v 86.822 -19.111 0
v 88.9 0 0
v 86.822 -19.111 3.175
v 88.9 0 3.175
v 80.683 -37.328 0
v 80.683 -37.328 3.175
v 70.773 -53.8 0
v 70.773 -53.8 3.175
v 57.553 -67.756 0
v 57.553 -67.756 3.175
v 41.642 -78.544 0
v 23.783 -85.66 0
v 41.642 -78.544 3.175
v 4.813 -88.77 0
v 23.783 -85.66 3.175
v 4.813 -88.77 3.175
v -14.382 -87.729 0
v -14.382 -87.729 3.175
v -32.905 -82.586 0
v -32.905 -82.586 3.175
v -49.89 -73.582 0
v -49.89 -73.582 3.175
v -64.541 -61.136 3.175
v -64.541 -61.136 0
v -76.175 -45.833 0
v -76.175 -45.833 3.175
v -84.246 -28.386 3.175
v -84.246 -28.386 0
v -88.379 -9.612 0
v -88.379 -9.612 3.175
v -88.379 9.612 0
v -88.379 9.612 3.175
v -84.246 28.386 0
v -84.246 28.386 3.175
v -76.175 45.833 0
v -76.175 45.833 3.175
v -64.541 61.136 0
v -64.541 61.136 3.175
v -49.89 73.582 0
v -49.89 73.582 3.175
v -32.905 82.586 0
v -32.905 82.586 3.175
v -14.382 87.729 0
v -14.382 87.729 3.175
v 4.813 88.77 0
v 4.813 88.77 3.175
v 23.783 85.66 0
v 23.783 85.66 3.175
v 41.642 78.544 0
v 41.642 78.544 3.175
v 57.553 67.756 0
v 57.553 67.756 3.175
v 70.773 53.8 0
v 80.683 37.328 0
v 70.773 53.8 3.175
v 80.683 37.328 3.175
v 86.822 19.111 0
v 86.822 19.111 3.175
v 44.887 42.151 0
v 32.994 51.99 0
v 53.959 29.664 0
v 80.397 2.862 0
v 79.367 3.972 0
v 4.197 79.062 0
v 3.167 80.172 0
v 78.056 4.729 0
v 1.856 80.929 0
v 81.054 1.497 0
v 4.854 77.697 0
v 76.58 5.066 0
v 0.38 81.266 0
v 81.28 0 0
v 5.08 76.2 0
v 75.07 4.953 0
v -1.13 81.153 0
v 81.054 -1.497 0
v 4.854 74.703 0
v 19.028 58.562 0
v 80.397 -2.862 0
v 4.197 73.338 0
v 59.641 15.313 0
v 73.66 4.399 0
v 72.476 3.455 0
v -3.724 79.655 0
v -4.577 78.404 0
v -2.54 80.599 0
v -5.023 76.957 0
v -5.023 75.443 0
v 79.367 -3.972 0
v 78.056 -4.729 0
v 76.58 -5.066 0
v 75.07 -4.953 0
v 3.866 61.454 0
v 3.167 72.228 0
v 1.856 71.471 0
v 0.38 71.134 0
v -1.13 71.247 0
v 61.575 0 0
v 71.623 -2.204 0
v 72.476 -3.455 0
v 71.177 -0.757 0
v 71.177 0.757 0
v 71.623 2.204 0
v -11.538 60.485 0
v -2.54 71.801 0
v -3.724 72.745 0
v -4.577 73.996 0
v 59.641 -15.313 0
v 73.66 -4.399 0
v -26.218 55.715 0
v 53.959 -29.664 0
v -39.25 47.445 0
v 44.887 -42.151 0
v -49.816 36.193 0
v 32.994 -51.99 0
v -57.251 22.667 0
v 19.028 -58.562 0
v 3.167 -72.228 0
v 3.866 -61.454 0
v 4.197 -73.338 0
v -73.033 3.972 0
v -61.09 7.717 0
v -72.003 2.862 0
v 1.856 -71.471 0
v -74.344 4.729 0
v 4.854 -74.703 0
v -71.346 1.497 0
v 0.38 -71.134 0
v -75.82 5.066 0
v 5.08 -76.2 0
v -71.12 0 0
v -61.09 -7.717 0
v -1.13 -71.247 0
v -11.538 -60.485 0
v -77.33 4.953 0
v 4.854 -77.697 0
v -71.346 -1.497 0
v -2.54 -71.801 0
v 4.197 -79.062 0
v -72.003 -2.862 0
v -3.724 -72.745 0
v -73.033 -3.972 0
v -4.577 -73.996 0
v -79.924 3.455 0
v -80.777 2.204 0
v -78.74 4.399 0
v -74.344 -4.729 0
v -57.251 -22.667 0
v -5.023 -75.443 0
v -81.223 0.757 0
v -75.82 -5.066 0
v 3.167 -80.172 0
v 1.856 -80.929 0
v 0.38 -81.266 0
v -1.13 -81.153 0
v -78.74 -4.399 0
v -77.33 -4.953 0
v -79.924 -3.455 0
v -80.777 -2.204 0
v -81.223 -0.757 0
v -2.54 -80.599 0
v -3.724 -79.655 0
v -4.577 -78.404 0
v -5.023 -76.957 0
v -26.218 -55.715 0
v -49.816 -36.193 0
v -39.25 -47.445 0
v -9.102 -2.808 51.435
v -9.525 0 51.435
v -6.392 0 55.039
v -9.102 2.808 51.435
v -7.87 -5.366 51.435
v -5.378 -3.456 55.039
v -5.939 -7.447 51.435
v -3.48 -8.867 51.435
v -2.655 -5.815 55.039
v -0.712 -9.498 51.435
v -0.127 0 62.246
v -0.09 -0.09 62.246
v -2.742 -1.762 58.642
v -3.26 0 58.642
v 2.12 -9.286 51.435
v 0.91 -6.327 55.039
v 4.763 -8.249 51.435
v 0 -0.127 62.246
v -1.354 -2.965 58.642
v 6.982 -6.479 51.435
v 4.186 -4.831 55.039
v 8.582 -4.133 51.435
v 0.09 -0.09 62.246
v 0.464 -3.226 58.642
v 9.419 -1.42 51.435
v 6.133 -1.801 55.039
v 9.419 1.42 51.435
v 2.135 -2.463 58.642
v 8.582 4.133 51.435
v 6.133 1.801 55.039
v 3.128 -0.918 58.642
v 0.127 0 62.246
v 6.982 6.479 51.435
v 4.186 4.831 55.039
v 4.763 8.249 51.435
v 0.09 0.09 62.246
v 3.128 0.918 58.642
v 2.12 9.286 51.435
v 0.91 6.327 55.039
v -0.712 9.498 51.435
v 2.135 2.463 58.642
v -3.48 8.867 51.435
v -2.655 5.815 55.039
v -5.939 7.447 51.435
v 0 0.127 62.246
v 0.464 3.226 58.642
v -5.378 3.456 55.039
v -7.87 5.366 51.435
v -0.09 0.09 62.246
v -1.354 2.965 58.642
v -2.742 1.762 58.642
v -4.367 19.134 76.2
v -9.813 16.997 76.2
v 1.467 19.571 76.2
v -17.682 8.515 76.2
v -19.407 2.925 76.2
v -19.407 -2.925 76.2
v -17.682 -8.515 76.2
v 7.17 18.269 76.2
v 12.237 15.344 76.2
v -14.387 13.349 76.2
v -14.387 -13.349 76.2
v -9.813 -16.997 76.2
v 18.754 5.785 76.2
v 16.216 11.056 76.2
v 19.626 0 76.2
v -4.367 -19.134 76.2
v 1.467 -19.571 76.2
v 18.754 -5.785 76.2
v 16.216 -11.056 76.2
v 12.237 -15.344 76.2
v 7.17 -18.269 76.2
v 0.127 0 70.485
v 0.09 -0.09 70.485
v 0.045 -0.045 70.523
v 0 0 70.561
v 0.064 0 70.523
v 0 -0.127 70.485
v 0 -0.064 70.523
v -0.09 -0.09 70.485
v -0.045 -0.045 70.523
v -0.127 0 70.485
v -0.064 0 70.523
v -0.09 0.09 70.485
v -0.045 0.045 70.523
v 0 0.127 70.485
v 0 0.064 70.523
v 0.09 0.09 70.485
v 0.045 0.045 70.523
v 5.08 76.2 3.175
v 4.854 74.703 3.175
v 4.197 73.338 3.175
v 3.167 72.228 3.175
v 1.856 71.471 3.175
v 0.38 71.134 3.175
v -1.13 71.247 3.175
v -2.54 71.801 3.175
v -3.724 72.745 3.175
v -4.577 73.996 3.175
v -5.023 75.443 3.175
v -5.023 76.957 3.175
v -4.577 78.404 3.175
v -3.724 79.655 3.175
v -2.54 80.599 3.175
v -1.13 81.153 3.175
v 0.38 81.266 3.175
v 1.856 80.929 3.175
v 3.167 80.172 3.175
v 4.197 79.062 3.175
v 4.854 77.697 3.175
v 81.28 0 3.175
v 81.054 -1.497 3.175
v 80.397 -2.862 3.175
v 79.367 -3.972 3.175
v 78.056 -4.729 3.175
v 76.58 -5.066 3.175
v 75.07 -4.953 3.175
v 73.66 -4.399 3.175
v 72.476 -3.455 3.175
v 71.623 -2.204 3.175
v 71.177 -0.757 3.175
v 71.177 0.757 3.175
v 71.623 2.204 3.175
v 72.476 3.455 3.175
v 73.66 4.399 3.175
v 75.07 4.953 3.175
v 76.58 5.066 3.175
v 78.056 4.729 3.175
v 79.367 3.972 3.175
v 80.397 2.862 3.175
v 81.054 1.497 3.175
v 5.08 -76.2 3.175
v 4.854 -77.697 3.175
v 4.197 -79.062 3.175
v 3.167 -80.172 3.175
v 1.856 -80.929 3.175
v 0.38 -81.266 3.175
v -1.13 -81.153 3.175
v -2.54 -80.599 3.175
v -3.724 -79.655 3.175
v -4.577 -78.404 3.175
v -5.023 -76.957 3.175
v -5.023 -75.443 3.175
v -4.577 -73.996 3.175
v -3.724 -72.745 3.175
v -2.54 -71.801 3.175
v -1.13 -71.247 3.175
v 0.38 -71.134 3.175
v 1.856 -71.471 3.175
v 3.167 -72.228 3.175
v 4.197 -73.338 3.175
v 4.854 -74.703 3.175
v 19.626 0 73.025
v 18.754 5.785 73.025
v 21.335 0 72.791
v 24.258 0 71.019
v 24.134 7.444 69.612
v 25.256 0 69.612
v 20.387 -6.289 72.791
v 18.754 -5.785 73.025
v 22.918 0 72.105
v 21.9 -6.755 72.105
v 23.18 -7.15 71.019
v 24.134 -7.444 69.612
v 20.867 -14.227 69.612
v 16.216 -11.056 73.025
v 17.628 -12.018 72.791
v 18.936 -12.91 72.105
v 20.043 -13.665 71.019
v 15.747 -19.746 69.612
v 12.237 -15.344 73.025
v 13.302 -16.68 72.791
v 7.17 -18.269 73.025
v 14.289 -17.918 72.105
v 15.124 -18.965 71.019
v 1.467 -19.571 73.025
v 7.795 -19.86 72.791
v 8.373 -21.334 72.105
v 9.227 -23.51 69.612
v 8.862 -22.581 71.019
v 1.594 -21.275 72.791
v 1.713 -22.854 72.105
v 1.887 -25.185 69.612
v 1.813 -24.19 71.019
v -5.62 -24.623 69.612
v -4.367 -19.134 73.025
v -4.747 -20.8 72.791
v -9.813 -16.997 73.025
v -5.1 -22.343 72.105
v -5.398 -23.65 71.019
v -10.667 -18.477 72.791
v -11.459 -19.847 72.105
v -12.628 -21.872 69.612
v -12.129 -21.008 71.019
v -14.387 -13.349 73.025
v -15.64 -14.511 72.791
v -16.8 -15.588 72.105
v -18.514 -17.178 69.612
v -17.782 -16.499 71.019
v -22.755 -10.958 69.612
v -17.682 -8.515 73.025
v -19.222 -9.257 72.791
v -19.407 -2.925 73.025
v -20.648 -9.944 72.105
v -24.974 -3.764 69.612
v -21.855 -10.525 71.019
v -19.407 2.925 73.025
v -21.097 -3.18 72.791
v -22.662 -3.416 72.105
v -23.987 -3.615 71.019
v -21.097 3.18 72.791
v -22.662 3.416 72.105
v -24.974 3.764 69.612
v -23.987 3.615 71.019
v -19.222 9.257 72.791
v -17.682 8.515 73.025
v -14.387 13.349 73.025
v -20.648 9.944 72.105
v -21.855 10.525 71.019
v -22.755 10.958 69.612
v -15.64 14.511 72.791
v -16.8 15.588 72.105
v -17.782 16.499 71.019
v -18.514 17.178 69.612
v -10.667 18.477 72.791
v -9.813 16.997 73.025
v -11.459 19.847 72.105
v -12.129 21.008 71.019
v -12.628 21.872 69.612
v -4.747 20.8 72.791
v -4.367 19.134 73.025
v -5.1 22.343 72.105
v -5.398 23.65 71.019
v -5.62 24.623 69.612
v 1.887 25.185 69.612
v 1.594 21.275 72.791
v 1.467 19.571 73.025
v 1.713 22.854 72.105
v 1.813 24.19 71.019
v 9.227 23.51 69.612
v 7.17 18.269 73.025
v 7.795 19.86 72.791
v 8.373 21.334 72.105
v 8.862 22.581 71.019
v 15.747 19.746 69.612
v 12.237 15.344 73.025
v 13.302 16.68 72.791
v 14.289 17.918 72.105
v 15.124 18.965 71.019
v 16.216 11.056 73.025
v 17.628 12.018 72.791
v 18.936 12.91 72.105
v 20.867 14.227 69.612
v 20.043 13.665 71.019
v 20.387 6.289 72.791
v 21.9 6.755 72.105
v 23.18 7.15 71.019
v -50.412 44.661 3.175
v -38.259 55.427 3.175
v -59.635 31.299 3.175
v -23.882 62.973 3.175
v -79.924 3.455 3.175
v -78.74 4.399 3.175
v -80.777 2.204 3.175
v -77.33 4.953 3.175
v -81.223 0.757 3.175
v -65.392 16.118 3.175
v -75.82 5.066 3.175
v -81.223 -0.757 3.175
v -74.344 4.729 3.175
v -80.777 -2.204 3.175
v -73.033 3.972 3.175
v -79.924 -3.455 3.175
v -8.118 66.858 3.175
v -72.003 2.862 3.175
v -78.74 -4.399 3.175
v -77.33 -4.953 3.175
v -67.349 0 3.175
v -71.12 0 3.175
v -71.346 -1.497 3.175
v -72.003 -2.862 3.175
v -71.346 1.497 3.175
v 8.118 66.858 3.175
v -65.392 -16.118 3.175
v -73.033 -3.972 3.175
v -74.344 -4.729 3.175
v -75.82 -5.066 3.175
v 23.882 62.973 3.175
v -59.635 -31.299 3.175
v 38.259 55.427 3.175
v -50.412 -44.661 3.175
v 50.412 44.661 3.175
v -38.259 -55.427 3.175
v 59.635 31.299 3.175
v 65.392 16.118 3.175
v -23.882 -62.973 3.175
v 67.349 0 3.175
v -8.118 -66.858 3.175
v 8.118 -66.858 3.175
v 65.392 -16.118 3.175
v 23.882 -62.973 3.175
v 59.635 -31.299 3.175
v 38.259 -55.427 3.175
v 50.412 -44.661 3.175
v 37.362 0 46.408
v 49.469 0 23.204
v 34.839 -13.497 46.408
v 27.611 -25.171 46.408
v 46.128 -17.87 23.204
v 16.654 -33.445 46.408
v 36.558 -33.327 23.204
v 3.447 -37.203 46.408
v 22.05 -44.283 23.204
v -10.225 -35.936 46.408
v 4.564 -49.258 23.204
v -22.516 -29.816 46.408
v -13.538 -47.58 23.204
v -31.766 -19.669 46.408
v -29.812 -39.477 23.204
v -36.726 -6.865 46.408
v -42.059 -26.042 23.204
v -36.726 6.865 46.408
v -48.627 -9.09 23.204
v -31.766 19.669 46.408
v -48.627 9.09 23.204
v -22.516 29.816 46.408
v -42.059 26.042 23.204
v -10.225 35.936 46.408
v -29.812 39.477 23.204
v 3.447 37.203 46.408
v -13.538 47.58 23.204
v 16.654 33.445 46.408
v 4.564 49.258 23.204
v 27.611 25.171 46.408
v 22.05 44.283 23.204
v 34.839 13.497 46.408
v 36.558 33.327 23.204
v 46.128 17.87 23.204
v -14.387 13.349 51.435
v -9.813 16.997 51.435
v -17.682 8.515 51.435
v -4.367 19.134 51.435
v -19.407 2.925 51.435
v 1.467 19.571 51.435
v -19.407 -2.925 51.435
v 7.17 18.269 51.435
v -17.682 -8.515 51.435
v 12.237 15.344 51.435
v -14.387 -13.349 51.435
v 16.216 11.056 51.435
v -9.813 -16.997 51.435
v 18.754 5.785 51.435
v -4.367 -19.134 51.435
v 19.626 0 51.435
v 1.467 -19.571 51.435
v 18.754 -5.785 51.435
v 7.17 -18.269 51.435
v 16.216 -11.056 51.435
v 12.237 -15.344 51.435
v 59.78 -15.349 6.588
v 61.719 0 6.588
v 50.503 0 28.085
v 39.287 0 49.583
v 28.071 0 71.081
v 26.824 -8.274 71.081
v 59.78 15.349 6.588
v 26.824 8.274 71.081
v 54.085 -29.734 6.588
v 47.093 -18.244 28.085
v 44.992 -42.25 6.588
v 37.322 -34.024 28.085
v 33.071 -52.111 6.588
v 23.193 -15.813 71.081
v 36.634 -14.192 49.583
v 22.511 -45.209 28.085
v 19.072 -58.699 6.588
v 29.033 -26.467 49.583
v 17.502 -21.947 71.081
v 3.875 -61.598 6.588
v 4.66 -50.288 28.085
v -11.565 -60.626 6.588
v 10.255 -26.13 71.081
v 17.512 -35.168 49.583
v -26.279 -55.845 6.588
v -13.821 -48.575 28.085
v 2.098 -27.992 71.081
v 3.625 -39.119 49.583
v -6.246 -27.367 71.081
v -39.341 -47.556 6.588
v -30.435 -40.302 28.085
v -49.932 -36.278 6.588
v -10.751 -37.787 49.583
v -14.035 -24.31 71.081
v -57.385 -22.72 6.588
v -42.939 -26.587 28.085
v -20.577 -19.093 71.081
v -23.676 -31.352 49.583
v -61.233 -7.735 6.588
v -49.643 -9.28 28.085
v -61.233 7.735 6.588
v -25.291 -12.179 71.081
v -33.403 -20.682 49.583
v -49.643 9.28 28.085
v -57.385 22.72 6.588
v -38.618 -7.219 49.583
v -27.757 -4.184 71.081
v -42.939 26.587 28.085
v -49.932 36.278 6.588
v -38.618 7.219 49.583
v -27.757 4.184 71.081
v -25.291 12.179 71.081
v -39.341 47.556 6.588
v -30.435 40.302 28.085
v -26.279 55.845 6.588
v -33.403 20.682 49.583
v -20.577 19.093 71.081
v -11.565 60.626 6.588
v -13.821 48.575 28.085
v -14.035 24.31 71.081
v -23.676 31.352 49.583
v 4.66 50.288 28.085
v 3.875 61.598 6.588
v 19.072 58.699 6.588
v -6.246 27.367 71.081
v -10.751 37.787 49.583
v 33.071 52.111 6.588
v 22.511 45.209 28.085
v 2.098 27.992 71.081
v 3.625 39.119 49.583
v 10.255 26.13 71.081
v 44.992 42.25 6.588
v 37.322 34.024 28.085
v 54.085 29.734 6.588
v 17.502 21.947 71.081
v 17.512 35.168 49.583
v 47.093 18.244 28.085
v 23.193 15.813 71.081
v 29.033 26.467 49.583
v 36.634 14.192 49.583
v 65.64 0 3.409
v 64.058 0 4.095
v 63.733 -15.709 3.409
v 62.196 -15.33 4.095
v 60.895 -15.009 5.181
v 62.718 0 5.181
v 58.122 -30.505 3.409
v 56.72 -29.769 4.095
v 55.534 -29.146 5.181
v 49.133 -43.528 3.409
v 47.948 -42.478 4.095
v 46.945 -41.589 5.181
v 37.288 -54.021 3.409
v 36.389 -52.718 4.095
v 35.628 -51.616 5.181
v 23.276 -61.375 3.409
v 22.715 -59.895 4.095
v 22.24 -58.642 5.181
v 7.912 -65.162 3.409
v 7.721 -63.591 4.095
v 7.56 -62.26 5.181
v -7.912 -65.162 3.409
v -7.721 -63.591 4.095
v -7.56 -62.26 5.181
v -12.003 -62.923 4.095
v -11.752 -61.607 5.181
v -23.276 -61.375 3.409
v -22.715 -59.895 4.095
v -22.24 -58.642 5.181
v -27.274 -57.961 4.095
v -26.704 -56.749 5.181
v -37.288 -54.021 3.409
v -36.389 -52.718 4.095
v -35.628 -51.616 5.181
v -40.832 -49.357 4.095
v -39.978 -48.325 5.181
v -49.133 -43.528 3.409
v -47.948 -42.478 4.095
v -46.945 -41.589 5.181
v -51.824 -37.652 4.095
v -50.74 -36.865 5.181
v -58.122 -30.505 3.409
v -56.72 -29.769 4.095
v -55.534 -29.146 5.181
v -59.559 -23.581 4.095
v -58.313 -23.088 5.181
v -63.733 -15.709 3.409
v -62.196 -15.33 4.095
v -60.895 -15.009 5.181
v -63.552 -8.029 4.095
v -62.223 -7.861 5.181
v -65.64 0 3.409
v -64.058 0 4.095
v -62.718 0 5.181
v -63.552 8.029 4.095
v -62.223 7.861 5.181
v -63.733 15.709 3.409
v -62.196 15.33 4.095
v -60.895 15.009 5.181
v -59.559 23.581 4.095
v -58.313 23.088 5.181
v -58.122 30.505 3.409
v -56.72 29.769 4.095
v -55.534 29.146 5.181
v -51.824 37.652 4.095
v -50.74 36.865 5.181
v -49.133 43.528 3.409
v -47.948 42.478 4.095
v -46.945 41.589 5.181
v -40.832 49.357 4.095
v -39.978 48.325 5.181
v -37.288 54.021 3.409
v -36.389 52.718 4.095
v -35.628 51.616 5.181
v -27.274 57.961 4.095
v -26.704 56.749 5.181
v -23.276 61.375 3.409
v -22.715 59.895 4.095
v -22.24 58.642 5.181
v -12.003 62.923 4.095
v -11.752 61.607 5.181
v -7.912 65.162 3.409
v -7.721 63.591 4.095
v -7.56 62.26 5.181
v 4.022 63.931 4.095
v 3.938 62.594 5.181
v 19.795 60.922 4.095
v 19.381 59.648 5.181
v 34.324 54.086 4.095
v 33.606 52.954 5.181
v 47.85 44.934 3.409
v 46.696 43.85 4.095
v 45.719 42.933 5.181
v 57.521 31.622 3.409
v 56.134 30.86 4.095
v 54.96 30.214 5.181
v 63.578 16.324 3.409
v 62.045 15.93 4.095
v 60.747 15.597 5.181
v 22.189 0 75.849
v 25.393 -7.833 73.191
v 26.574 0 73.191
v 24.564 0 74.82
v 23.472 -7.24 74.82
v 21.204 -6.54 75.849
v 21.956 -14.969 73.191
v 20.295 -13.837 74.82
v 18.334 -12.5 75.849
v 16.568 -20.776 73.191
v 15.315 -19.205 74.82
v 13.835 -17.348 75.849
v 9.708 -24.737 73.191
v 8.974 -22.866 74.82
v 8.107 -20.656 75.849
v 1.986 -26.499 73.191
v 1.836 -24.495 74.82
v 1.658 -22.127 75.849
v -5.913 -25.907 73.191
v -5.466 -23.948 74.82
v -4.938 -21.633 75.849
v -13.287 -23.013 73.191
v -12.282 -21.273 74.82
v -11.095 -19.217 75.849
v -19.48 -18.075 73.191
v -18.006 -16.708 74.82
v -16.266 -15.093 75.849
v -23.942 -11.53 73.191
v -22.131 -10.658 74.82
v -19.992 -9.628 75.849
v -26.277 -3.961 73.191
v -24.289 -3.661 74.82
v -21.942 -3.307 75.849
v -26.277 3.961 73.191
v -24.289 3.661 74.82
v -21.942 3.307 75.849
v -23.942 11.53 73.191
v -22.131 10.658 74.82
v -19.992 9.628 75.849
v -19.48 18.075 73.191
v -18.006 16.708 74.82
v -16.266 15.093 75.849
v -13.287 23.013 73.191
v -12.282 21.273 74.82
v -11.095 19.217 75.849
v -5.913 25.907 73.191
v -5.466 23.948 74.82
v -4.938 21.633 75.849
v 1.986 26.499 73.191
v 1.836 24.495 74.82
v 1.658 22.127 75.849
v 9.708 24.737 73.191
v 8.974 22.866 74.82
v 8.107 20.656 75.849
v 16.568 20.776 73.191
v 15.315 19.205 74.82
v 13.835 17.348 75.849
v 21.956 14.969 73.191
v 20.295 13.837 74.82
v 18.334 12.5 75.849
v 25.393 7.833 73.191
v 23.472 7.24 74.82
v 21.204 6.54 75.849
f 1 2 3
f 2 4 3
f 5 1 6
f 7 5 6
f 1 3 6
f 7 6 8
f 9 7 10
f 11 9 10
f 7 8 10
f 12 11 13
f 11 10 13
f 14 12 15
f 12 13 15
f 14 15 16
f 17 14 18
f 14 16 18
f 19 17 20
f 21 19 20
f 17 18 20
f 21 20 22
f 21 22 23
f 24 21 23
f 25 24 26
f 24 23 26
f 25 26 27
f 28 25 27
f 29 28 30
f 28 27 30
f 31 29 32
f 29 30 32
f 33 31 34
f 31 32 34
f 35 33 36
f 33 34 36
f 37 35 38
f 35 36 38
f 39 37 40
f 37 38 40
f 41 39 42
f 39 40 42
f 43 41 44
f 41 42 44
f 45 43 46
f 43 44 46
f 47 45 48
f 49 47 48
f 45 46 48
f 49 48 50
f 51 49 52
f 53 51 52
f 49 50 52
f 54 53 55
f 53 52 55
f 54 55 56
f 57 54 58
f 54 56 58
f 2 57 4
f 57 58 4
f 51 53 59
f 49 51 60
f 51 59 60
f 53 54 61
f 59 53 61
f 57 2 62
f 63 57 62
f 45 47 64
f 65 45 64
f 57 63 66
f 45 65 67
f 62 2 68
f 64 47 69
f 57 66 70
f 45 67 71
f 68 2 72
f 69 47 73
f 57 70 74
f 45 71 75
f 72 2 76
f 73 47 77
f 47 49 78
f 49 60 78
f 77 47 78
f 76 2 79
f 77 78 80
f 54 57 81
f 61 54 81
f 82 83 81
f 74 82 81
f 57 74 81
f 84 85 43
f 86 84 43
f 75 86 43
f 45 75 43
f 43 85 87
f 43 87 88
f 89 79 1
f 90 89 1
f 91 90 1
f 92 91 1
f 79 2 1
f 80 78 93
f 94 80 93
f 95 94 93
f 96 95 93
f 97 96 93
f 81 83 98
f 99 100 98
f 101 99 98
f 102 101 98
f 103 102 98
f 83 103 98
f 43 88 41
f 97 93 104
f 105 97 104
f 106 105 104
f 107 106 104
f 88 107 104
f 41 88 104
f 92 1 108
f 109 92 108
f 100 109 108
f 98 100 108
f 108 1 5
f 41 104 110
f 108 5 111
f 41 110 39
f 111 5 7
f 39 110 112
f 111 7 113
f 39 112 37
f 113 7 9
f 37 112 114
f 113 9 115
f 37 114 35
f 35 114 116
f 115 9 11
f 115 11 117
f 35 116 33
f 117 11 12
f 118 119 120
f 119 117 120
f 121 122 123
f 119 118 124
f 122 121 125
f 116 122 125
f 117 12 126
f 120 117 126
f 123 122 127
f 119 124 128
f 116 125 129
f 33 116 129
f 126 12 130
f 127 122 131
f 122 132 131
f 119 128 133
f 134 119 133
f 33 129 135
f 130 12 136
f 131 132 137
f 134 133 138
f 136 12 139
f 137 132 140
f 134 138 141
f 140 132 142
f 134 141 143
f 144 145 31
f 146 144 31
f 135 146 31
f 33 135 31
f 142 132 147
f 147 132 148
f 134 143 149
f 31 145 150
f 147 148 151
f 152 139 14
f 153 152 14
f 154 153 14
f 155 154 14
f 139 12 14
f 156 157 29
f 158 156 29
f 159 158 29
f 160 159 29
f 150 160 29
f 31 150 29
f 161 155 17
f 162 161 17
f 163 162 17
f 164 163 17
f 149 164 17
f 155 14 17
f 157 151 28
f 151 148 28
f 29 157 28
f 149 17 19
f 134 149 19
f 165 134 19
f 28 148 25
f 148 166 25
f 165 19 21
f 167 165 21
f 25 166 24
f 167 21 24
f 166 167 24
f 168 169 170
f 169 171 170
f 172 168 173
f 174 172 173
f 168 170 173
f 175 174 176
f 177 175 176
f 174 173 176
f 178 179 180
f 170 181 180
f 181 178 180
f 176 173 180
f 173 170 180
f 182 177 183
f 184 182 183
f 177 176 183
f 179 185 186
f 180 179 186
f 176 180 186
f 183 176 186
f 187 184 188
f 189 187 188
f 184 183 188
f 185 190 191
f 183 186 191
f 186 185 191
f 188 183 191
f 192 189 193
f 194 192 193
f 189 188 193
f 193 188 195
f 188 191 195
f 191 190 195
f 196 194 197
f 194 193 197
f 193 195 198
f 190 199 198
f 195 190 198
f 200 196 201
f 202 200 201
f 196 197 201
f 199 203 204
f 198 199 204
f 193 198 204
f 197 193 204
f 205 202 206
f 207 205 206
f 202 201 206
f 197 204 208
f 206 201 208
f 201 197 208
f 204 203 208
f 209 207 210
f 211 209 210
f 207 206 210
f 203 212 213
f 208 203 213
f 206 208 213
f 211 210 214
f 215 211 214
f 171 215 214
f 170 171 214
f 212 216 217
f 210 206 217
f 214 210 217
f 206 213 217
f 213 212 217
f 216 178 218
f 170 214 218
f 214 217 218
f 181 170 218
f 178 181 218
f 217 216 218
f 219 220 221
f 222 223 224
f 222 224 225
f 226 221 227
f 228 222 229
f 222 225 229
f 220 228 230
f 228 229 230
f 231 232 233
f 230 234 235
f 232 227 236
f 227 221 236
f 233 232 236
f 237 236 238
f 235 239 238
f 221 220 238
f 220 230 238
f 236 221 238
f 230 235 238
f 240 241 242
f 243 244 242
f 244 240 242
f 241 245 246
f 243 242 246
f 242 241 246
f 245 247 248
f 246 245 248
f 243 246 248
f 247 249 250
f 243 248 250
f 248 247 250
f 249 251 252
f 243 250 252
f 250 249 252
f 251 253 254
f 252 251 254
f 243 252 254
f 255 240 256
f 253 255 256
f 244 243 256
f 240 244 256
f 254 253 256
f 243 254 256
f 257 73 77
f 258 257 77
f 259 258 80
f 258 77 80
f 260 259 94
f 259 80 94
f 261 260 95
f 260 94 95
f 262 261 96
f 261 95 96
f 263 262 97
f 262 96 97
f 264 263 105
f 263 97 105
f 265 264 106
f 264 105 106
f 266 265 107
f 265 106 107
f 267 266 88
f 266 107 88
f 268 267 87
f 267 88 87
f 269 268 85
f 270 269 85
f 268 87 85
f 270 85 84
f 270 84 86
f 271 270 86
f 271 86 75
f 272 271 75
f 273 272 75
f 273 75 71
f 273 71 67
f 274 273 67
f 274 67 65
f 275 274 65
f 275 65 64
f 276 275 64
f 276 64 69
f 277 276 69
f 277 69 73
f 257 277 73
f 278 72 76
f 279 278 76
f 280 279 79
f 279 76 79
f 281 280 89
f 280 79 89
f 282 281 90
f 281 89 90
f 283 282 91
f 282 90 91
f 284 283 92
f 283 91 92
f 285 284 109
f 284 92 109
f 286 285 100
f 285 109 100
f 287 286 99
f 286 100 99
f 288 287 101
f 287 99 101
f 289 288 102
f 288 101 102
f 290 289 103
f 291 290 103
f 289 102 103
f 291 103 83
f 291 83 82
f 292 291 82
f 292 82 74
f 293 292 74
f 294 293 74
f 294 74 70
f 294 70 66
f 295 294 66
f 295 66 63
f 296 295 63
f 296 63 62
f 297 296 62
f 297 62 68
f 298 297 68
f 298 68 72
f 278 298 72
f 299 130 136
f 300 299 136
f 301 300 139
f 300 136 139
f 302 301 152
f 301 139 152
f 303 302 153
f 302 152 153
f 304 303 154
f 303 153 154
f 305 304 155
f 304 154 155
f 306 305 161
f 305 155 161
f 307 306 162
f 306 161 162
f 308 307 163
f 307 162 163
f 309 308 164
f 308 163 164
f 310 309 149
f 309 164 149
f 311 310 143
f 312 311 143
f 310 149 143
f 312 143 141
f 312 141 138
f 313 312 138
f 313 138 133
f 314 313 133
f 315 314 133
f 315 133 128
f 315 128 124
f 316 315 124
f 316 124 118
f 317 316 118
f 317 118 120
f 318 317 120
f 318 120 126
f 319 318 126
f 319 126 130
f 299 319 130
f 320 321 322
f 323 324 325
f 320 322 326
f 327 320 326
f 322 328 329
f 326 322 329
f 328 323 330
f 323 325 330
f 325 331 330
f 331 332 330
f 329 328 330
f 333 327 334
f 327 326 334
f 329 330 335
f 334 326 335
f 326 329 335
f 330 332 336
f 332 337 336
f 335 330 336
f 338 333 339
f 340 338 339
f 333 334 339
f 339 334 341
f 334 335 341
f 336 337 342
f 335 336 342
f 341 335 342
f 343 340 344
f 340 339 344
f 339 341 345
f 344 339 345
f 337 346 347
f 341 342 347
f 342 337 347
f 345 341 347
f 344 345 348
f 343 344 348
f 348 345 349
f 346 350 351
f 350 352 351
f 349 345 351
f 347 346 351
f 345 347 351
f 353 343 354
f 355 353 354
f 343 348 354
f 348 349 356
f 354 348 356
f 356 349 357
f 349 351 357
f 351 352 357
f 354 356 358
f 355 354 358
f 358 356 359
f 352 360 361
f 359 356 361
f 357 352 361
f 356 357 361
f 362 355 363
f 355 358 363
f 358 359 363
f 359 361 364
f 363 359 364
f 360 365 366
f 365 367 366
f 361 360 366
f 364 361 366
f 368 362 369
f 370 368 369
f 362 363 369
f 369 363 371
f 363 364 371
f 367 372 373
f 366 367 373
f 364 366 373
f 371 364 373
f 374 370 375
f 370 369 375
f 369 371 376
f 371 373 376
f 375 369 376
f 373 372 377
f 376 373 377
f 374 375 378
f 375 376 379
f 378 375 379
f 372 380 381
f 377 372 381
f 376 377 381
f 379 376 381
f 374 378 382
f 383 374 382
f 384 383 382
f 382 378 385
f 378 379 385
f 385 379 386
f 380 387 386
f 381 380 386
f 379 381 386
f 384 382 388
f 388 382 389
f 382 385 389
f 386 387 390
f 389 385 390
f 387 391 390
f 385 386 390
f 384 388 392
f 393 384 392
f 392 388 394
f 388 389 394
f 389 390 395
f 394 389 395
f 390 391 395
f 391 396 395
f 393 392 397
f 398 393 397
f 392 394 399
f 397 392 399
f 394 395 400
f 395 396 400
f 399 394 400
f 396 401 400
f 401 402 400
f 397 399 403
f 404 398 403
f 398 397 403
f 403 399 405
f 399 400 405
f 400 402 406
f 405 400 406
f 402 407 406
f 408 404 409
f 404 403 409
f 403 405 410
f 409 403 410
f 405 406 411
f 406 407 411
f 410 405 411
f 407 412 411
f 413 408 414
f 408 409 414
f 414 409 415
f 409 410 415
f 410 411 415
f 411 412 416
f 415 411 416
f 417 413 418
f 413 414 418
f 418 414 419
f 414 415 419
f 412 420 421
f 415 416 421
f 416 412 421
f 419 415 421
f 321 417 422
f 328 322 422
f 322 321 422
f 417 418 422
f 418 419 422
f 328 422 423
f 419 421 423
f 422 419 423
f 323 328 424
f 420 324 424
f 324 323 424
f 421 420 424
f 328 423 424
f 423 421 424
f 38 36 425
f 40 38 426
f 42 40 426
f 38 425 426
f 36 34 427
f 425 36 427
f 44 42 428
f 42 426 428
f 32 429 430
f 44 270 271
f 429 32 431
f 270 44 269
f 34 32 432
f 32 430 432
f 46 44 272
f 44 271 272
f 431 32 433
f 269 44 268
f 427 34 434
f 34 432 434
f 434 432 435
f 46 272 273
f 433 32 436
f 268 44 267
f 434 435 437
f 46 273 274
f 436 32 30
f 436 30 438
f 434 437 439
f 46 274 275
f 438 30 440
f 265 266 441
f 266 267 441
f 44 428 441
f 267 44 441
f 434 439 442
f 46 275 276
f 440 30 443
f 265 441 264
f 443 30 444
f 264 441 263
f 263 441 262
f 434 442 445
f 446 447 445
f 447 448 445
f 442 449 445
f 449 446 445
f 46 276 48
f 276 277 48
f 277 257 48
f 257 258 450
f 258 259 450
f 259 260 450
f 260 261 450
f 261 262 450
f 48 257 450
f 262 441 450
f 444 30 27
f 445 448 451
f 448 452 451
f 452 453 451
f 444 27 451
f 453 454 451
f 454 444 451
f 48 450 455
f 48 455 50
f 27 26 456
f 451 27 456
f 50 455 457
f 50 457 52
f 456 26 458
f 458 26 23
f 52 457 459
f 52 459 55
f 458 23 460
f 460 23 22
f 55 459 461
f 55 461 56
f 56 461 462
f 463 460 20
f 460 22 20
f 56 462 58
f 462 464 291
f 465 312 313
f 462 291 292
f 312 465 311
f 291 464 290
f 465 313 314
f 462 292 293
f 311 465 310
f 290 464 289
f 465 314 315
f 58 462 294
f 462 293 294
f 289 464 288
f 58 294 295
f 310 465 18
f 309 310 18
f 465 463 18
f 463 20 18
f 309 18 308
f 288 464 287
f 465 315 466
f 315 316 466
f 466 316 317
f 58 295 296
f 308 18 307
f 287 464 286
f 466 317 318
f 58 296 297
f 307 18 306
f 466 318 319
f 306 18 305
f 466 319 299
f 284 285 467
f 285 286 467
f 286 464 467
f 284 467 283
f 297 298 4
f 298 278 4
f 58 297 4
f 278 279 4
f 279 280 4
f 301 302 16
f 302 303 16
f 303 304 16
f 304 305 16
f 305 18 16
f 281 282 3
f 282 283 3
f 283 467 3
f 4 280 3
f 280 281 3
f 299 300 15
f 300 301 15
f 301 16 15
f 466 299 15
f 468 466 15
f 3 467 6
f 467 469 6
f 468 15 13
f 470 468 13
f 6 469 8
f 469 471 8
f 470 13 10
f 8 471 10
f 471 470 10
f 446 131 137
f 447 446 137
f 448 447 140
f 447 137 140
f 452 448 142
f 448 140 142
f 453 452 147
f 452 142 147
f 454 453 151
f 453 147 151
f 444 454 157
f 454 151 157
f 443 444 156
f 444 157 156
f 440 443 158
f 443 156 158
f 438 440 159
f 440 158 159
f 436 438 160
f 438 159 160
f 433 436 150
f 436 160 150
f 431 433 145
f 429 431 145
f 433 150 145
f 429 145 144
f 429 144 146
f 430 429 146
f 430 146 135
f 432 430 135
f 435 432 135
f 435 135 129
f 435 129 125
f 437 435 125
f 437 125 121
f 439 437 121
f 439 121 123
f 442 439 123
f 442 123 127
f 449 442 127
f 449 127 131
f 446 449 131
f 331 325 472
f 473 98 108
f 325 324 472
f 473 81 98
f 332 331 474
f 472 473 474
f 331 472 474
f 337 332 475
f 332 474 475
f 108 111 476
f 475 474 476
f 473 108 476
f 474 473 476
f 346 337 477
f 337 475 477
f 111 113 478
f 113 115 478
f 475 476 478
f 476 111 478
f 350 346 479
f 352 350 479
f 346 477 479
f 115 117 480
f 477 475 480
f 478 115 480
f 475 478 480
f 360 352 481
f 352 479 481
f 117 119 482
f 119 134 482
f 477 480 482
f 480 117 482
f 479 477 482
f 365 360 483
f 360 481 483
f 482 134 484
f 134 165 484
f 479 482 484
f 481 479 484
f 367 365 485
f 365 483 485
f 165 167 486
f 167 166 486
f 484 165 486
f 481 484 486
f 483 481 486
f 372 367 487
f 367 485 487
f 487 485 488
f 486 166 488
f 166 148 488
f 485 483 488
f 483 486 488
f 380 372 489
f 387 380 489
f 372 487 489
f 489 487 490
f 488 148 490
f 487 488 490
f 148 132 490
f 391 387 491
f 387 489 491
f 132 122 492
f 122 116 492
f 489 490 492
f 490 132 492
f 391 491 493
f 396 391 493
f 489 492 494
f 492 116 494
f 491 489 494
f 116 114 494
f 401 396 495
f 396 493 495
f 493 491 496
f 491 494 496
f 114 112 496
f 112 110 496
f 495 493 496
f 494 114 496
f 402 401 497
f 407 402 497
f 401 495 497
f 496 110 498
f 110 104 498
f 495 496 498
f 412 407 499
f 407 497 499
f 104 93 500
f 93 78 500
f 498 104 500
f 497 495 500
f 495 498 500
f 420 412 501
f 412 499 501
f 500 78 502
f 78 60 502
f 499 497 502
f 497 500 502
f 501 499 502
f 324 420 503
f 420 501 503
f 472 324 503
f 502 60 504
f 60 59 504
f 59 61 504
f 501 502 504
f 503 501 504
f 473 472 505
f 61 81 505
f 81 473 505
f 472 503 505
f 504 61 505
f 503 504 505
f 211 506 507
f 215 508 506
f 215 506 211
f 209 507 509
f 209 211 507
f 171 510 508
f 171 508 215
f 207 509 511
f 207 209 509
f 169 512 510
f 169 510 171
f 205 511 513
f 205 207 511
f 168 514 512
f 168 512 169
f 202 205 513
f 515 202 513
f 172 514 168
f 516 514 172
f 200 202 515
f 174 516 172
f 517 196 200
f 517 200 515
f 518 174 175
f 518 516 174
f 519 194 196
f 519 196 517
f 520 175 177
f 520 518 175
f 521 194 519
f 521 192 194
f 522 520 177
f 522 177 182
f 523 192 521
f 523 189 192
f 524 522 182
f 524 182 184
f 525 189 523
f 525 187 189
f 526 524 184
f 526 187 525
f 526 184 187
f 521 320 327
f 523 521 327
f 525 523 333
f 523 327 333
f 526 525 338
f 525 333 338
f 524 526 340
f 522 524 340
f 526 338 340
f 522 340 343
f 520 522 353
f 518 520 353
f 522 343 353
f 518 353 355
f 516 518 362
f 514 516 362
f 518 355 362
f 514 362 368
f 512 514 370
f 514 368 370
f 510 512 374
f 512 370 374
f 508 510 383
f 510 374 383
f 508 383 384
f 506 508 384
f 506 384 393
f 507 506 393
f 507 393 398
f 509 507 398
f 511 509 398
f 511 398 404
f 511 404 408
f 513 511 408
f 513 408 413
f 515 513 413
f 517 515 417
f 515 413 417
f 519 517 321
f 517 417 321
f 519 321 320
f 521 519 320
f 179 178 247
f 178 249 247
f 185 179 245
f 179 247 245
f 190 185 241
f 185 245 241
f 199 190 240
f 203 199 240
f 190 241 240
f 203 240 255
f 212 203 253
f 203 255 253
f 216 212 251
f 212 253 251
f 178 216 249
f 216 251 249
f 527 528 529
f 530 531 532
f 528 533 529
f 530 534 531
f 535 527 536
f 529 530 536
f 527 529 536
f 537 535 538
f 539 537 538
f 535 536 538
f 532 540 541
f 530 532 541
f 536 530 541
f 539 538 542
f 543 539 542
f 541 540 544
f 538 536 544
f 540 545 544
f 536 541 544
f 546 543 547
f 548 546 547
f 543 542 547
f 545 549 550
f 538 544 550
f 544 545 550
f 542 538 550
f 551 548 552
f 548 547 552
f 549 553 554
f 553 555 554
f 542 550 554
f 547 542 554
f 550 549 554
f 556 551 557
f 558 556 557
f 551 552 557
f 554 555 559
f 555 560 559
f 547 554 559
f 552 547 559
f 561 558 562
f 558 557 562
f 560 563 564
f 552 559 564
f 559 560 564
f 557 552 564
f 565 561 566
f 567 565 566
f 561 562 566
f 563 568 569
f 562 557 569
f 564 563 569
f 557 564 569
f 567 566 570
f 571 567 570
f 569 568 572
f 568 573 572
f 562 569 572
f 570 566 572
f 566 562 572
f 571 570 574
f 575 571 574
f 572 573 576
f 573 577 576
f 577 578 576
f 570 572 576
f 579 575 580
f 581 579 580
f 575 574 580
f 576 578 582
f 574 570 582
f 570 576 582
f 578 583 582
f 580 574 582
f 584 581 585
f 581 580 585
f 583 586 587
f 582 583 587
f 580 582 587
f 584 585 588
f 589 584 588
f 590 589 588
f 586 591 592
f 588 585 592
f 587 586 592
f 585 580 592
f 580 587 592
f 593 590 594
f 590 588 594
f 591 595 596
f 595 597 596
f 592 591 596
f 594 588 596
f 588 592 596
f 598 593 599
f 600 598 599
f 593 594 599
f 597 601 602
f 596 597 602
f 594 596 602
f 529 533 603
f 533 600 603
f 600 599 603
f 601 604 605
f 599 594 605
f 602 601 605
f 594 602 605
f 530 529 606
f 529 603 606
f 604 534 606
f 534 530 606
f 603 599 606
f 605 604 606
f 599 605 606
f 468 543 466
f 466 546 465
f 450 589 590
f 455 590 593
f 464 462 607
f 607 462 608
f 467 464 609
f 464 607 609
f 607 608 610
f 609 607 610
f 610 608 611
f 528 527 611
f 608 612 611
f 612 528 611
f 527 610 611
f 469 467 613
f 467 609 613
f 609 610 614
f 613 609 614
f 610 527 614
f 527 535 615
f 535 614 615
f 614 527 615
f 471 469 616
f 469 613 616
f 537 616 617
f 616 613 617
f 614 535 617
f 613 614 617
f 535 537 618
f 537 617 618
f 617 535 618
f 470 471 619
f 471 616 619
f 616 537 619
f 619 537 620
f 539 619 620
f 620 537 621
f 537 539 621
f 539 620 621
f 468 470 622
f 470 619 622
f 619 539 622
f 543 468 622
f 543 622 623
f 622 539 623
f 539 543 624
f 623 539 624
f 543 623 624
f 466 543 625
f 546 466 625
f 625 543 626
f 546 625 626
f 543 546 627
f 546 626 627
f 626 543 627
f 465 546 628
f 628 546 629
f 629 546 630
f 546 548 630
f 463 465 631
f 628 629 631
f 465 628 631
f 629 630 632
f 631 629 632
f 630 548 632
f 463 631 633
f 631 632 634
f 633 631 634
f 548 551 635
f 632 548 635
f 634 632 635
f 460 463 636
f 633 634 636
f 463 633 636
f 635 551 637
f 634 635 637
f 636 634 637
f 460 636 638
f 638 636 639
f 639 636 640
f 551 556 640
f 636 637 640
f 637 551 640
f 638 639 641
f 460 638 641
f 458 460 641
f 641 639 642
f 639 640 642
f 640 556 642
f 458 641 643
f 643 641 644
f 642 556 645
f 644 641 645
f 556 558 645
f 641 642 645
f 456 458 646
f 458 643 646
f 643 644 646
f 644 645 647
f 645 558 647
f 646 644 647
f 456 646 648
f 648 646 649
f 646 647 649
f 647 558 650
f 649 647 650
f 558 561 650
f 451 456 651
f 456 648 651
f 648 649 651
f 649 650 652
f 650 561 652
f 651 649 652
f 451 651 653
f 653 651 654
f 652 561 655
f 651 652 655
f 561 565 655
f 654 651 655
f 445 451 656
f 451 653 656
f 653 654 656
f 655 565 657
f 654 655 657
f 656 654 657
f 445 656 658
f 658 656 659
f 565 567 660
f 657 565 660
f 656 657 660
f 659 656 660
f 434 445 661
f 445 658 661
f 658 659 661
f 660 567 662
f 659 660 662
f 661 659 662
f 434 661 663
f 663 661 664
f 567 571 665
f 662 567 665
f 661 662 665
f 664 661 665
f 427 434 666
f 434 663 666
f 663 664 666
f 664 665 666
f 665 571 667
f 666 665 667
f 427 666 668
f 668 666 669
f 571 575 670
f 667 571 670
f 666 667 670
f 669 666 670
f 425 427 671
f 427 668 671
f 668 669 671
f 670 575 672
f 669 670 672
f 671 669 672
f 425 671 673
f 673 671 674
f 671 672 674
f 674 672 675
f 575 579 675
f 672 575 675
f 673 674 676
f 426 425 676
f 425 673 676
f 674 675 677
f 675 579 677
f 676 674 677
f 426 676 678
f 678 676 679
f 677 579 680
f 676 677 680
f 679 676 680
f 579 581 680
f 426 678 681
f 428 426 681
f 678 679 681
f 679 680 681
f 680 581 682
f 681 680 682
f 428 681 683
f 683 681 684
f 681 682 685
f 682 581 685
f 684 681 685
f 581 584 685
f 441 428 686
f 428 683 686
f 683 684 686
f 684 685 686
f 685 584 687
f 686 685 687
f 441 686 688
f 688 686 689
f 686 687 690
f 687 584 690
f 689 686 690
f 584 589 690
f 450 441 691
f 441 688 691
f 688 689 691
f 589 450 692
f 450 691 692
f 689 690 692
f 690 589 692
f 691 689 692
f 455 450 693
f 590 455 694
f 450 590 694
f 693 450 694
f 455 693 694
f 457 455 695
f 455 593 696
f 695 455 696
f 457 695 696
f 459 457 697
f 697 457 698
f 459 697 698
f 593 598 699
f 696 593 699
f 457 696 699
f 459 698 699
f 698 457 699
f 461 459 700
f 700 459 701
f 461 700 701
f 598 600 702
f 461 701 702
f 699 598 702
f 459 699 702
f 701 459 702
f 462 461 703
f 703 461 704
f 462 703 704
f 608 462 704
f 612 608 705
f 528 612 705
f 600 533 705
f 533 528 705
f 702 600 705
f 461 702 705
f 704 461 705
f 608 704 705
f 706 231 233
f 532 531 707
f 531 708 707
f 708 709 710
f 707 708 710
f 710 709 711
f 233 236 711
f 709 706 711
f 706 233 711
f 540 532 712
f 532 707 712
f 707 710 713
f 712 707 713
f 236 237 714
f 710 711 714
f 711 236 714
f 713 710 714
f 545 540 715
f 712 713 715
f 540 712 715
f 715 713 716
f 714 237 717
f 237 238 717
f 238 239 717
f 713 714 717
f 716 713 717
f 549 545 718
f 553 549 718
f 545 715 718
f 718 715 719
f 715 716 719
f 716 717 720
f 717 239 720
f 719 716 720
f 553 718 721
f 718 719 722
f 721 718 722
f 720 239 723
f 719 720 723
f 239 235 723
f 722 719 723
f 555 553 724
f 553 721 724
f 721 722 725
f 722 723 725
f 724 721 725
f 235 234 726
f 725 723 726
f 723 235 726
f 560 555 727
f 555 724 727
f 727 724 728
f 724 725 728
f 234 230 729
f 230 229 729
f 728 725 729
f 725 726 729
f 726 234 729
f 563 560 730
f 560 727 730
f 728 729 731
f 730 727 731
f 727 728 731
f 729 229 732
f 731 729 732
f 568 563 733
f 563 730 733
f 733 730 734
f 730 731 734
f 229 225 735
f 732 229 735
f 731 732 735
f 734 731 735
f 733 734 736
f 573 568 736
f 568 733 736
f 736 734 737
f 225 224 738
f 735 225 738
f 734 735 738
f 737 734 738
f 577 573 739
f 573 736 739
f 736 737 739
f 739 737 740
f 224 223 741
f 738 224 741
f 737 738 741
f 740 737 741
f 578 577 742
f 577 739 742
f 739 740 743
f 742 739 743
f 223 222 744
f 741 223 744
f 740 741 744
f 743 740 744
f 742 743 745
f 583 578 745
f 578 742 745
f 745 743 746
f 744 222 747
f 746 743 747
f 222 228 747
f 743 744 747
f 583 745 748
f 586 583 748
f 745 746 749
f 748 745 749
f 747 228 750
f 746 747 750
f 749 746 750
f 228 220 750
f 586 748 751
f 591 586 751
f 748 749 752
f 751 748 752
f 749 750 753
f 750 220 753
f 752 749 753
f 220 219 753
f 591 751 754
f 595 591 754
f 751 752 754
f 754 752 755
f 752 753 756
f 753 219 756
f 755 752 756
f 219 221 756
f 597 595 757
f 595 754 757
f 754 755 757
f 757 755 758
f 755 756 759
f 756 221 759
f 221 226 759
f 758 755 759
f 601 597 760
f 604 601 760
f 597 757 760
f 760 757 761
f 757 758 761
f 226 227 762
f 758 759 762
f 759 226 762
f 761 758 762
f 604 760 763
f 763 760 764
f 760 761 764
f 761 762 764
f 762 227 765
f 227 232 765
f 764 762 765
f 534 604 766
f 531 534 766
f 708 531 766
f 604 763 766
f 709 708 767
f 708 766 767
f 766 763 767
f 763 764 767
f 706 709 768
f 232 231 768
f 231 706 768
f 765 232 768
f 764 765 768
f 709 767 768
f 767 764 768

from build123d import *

# Parameters (mm, degrees)
F2_R           = 5.08
F3_DEPTH       = 25.4
F4_R           = 19.62609262
F5_DEPTH       = 21.59
F7_D           = 0.254
F7_DEPTH       = 19.05
F7_CSINK_D     = 19.05
F7_CSINK_ANGLE = 82
F7_TIP         = 0.0763092986


with BuildPart() as f1:
    # F0 (on Front) → F1 (revolve)
    with BuildSketch(Plane.XZ):
        with BuildLine():
            Line((25.2559063932, 69.6122941425), (61.5753642067, 0))
            Line((61.5753642067, 0), (88.9, 0))
            Line((88.9, 0), (88.9, 3.175))
            Line((88.9, 3.175), (67.3492715866, 3.175))
            ThreePointArc((67.3492715866, 3.175), (64.0575636565, 4.0947920019), (61.7194578135, 6.5877058575))
            Line((61.7194578135, 6.5877058575), (28.0708132798, 71.0809412138))
            ThreePointArc((28.0708132798, 71.0809412138), (24.5636545153, 74.8203119971), (19.62609262, 76.2))
            Line((19.62609262, 76.2), (0, 76.2))
            Line((0, 76.2), (0, 73.025))
            Line((0, 73.025), (19.62609262, 73.025))
            ThreePointArc((19.62609262, 73.025), (22.9178005502, 72.1052079981), (25.2559063932, 69.6122941425))
        make_face()
    revolve(axis=Axis((0, 0, 35.2039765567), (0, 0, -1)))

    # F2 (on face) → F3 (cut)
    with BuildSketch(Plane(origin=(0, 0, 0), x_dir=(1, 0, 0), z_dir=(0, 0, -1))):
        with Locations((0, 76.2)):
            Circle(F2_R)
        with Locations((-76.2, 0)):
            Circle(F2_R)
        with Locations((0, -76.2)):
            Circle(F2_R)
        with Locations((76.2, 0)):
            Circle(F2_R)
    extrude(amount=-F3_DEPTH, mode=Mode.SUBTRACT)

    # F4 (on face) → F5 (join)
    with BuildSketch(Plane(origin=(0, 0, 73.025), x_dir=(1, 0, 0), z_dir=(0, 0, -1))):
        Circle(F4_R)
    extrude(amount=F5_DEPTH)

    # F7
    with Locations(Plane(origin=(0, 0, 51.435), x_dir=(1, 0, 0), z_dir=(0, 0, -1))):
        with Locations((0, 0)):
            CounterSinkHole(F7_D / 2, F7_CSINK_D / 2, depth=F7_DEPTH, counter_sink_angle=F7_CSINK_ANGLE)
            with Locations((0, 0, -(F7_DEPTH + F7_TIP / 2))):  # 118° drill point
                Cone(0, F7_D / 2, F7_TIP, mode=Mode.SUBTRACT)


solid = f1.part
